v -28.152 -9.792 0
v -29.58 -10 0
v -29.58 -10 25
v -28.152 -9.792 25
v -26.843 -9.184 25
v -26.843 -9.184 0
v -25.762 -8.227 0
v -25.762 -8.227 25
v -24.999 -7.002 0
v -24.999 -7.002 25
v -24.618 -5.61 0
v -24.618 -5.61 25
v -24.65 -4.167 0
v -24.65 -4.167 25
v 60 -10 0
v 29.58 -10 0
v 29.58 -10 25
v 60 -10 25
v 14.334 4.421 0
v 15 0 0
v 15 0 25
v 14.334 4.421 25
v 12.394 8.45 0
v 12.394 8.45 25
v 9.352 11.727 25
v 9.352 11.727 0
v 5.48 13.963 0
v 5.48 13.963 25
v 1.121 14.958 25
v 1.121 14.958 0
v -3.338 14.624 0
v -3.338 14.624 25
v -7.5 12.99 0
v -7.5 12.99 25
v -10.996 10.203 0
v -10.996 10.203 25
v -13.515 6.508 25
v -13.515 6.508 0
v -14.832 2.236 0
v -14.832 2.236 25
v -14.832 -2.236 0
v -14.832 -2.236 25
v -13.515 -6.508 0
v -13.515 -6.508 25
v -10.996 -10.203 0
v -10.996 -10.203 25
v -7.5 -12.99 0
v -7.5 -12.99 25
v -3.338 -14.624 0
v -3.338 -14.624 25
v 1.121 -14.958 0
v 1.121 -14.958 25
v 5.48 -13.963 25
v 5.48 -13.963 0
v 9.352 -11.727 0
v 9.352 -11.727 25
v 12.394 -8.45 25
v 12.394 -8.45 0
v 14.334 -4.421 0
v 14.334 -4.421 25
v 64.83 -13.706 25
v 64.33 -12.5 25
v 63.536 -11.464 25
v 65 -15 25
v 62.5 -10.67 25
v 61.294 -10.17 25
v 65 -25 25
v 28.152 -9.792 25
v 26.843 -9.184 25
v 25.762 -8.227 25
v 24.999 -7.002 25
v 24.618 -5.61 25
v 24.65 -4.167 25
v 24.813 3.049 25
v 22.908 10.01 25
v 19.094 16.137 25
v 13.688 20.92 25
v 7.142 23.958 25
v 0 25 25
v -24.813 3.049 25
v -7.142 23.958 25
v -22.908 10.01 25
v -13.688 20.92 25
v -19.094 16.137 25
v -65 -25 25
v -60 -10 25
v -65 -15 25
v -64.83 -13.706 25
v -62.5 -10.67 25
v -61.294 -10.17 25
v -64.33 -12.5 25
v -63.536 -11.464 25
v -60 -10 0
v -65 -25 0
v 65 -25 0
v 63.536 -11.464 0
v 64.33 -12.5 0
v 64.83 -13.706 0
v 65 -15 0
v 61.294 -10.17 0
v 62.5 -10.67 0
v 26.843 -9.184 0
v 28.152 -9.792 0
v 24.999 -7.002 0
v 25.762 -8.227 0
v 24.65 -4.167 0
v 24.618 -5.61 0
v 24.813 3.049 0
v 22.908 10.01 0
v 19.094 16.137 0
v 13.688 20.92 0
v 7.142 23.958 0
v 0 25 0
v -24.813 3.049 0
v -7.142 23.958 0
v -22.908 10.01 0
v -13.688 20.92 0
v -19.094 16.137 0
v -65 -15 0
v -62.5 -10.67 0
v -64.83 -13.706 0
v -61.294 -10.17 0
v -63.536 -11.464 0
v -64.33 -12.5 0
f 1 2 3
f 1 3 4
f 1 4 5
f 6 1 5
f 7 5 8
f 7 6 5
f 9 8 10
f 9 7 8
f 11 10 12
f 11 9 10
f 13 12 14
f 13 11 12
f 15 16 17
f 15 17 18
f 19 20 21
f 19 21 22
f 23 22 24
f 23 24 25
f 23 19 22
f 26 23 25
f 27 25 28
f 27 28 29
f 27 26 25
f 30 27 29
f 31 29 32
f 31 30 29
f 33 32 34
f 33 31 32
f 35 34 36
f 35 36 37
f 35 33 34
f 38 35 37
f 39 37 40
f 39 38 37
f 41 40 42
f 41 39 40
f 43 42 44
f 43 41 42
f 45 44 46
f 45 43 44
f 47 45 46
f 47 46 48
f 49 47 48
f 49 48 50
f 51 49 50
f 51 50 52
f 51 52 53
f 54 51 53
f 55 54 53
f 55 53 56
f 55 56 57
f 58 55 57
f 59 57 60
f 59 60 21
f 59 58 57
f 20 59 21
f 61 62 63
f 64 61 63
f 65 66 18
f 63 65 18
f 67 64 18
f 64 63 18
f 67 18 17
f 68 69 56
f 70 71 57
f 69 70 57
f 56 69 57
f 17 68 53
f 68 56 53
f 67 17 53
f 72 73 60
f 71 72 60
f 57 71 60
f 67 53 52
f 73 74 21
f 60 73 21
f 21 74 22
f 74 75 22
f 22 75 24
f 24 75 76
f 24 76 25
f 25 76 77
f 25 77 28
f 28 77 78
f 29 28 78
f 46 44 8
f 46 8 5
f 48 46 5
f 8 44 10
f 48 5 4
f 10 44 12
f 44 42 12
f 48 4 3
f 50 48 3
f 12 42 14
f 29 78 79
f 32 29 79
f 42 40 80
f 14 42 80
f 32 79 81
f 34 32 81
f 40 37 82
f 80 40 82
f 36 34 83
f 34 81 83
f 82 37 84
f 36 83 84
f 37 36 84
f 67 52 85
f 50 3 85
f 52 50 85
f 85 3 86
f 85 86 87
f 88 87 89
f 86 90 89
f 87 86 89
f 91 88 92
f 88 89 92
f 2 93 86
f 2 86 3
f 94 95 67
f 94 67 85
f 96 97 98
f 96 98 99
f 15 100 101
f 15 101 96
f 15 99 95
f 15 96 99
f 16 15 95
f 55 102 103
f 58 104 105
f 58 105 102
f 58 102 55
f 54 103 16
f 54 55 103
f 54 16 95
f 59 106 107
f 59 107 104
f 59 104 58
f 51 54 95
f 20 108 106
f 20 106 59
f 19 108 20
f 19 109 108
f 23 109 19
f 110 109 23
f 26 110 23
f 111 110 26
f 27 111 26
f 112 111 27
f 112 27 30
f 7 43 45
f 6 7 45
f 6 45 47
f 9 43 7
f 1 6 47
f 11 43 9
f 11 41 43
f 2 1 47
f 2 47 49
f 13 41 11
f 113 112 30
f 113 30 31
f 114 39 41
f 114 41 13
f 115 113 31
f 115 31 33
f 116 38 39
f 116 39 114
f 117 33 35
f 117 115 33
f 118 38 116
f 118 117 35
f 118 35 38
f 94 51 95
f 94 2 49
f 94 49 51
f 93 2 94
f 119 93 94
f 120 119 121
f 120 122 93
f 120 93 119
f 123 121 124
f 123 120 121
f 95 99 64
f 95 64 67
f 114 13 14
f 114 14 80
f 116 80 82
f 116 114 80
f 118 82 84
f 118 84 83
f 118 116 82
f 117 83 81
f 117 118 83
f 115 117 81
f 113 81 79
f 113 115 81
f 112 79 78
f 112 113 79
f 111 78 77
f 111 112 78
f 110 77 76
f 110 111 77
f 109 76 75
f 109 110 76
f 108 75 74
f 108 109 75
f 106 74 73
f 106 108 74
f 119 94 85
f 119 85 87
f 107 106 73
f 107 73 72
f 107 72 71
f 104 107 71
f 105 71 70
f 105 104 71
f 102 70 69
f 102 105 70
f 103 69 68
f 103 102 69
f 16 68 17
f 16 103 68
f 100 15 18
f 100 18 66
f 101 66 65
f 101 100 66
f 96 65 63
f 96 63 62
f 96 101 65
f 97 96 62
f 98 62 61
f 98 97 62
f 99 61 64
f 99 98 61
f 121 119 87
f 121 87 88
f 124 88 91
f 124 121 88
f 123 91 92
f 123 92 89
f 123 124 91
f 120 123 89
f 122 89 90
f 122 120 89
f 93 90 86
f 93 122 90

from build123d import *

# Parameters (mm, degrees)
SKETCH1_R           = 15
BOSS_EXTRUDE1_DEPTH = 25


with BuildPart() as part:
    # Sketch1 → Boss-Extrude1 (new body)
    with BuildSketch(Plane.XY):
        with BuildLine():
            Line((-65, -25), (-65, -15))
            ThreePointArc((-65, -15), (-63.535533906, -11.464466094), (-60, -10))
            Line((-60, -10), (-29.580398915, -10))
            ThreePointArc((-29.580398915, -10), (-25.761585836, -8.227486122), (-24.65033243, -4.166666667))
            ThreePointArc((-24.65033243, -4.166666667), (0, 25), (24.65033243, -4.166666667))
            ThreePointArc((24.65033243, -4.166666667), (25.761585836, -8.227486122), (29.580398915, -10))
            Line((29.580398915, -10), (60, -10))
            ThreePointArc((60, -10), (63.535533906, -11.464466094), (65, -15))
            Line((65, -15), (65, -25))
            Line((65, -25), (-65, -25))
        make_face()
        Circle(SKETCH1_R, mode=Mode.SUBTRACT)
    extrude(amount=BOSS_EXTRUDE1_DEPTH)


solid = part.part
